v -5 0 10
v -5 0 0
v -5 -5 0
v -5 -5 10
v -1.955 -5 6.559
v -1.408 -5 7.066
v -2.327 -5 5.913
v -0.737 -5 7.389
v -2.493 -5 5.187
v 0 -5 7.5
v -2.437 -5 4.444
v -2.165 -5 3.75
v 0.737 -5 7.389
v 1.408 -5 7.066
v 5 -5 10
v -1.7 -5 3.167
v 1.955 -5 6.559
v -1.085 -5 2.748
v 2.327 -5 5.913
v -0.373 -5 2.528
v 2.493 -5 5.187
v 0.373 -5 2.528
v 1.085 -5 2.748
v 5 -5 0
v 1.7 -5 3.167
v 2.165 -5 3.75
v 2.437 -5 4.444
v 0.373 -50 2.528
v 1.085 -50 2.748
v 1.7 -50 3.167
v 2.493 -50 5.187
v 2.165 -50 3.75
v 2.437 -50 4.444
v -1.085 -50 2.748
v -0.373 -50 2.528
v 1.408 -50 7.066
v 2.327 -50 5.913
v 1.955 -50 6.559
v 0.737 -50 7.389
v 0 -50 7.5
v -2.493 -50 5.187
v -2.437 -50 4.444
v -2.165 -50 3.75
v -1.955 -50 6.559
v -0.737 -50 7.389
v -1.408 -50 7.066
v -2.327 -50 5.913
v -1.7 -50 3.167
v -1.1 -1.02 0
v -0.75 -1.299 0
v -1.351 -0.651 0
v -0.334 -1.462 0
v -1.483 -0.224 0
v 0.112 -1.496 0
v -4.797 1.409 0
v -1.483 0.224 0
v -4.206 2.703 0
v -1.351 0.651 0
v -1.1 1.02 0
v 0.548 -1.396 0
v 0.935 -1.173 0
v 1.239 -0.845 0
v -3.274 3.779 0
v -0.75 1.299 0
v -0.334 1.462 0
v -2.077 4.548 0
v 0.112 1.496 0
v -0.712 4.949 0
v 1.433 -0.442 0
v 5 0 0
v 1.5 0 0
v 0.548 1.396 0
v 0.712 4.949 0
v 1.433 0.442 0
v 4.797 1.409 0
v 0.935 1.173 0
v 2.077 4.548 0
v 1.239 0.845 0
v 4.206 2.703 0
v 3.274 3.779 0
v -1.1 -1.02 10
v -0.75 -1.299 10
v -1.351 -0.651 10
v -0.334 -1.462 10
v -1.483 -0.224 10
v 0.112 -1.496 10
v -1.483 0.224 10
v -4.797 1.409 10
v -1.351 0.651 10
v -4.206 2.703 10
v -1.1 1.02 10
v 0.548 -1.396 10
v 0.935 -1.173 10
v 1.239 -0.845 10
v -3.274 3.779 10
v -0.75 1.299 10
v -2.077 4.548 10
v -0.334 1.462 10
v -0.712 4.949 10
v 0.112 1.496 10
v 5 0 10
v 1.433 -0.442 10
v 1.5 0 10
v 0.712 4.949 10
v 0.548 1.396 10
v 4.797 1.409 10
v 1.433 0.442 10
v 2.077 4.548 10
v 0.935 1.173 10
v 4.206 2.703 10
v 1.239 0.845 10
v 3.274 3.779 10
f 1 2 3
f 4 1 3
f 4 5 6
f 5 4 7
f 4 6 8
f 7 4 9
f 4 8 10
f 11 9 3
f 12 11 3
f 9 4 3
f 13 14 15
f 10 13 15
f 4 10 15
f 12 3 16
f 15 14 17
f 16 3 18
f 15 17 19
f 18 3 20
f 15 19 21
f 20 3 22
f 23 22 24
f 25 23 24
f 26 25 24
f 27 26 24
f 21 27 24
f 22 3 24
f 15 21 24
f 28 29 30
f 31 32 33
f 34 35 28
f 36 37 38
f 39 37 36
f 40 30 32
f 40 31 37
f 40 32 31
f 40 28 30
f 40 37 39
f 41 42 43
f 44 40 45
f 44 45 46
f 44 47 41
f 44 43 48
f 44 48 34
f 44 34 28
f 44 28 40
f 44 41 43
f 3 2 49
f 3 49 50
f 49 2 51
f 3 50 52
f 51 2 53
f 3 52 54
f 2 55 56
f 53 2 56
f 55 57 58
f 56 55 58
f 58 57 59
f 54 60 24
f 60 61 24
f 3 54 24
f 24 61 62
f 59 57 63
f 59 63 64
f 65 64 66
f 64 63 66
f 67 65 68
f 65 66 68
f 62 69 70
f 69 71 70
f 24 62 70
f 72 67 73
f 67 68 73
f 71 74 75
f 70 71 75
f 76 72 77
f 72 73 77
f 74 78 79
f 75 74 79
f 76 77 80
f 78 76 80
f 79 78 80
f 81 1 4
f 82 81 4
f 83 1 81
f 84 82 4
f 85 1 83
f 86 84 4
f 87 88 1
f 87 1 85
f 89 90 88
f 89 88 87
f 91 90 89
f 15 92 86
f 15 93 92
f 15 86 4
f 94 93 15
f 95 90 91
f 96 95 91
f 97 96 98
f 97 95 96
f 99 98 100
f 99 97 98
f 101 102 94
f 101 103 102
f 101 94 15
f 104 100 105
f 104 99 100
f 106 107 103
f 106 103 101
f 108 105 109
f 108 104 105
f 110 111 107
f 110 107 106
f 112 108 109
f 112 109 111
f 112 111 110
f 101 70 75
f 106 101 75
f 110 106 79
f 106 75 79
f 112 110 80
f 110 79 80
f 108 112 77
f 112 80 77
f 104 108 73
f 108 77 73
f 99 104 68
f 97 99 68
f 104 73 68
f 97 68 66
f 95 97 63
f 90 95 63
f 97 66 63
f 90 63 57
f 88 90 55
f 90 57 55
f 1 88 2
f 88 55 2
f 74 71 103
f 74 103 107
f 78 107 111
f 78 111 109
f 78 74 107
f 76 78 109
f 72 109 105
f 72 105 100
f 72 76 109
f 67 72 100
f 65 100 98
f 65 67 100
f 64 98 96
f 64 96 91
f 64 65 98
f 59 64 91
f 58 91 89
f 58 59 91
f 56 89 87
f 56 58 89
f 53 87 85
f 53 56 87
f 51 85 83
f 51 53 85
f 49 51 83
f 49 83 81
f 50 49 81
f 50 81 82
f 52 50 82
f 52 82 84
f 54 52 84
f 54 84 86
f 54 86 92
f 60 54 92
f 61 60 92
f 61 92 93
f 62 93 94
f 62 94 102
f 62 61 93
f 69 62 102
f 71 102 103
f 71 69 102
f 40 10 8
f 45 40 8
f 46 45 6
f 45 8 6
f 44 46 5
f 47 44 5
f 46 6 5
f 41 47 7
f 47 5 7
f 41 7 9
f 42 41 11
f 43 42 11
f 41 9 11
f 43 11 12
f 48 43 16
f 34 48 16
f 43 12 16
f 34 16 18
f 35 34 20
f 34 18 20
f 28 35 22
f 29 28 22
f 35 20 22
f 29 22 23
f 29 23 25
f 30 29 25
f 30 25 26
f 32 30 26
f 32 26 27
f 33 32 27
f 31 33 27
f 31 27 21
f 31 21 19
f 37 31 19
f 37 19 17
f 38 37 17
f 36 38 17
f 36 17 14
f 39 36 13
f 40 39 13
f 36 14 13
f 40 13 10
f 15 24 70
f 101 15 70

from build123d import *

# Parameters (mm, degrees)
CROQUIS1_R              = 1.5
SALIENTE_EXTRUIR1_DEPTH = 10
CROQUIS2_R              = 2.5
SALIENTE_EXTRUIR2_DEPTH = 45


with BuildPart() as part:
    # Croquis1 → Saliente-Extruir1 (new body)
    with BuildSketch(Plane.XY):
        with BuildLine():
            Line((-5, 0), (-5, -5))
            Line((-5, -5), (5, -5))
            Line((5, -5), (5, 0))
            ThreePointArc((5, 0), (0, 5), (-5, 0))
        make_face()
        Circle(CROQUIS1_R, mode=Mode.SUBTRACT)
    extrude(amount=SALIENTE_EXTRUIR1_DEPTH)

    # Croquis2 → Saliente-Extruir2 (add)
    with BuildSketch(Plane.XZ.offset(5)):
        with Locations((0, 5)):
            Circle(CROQUIS2_R)
    extrude(amount=SALIENTE_EXTRUIR2_DEPTH)


solid = part.part
